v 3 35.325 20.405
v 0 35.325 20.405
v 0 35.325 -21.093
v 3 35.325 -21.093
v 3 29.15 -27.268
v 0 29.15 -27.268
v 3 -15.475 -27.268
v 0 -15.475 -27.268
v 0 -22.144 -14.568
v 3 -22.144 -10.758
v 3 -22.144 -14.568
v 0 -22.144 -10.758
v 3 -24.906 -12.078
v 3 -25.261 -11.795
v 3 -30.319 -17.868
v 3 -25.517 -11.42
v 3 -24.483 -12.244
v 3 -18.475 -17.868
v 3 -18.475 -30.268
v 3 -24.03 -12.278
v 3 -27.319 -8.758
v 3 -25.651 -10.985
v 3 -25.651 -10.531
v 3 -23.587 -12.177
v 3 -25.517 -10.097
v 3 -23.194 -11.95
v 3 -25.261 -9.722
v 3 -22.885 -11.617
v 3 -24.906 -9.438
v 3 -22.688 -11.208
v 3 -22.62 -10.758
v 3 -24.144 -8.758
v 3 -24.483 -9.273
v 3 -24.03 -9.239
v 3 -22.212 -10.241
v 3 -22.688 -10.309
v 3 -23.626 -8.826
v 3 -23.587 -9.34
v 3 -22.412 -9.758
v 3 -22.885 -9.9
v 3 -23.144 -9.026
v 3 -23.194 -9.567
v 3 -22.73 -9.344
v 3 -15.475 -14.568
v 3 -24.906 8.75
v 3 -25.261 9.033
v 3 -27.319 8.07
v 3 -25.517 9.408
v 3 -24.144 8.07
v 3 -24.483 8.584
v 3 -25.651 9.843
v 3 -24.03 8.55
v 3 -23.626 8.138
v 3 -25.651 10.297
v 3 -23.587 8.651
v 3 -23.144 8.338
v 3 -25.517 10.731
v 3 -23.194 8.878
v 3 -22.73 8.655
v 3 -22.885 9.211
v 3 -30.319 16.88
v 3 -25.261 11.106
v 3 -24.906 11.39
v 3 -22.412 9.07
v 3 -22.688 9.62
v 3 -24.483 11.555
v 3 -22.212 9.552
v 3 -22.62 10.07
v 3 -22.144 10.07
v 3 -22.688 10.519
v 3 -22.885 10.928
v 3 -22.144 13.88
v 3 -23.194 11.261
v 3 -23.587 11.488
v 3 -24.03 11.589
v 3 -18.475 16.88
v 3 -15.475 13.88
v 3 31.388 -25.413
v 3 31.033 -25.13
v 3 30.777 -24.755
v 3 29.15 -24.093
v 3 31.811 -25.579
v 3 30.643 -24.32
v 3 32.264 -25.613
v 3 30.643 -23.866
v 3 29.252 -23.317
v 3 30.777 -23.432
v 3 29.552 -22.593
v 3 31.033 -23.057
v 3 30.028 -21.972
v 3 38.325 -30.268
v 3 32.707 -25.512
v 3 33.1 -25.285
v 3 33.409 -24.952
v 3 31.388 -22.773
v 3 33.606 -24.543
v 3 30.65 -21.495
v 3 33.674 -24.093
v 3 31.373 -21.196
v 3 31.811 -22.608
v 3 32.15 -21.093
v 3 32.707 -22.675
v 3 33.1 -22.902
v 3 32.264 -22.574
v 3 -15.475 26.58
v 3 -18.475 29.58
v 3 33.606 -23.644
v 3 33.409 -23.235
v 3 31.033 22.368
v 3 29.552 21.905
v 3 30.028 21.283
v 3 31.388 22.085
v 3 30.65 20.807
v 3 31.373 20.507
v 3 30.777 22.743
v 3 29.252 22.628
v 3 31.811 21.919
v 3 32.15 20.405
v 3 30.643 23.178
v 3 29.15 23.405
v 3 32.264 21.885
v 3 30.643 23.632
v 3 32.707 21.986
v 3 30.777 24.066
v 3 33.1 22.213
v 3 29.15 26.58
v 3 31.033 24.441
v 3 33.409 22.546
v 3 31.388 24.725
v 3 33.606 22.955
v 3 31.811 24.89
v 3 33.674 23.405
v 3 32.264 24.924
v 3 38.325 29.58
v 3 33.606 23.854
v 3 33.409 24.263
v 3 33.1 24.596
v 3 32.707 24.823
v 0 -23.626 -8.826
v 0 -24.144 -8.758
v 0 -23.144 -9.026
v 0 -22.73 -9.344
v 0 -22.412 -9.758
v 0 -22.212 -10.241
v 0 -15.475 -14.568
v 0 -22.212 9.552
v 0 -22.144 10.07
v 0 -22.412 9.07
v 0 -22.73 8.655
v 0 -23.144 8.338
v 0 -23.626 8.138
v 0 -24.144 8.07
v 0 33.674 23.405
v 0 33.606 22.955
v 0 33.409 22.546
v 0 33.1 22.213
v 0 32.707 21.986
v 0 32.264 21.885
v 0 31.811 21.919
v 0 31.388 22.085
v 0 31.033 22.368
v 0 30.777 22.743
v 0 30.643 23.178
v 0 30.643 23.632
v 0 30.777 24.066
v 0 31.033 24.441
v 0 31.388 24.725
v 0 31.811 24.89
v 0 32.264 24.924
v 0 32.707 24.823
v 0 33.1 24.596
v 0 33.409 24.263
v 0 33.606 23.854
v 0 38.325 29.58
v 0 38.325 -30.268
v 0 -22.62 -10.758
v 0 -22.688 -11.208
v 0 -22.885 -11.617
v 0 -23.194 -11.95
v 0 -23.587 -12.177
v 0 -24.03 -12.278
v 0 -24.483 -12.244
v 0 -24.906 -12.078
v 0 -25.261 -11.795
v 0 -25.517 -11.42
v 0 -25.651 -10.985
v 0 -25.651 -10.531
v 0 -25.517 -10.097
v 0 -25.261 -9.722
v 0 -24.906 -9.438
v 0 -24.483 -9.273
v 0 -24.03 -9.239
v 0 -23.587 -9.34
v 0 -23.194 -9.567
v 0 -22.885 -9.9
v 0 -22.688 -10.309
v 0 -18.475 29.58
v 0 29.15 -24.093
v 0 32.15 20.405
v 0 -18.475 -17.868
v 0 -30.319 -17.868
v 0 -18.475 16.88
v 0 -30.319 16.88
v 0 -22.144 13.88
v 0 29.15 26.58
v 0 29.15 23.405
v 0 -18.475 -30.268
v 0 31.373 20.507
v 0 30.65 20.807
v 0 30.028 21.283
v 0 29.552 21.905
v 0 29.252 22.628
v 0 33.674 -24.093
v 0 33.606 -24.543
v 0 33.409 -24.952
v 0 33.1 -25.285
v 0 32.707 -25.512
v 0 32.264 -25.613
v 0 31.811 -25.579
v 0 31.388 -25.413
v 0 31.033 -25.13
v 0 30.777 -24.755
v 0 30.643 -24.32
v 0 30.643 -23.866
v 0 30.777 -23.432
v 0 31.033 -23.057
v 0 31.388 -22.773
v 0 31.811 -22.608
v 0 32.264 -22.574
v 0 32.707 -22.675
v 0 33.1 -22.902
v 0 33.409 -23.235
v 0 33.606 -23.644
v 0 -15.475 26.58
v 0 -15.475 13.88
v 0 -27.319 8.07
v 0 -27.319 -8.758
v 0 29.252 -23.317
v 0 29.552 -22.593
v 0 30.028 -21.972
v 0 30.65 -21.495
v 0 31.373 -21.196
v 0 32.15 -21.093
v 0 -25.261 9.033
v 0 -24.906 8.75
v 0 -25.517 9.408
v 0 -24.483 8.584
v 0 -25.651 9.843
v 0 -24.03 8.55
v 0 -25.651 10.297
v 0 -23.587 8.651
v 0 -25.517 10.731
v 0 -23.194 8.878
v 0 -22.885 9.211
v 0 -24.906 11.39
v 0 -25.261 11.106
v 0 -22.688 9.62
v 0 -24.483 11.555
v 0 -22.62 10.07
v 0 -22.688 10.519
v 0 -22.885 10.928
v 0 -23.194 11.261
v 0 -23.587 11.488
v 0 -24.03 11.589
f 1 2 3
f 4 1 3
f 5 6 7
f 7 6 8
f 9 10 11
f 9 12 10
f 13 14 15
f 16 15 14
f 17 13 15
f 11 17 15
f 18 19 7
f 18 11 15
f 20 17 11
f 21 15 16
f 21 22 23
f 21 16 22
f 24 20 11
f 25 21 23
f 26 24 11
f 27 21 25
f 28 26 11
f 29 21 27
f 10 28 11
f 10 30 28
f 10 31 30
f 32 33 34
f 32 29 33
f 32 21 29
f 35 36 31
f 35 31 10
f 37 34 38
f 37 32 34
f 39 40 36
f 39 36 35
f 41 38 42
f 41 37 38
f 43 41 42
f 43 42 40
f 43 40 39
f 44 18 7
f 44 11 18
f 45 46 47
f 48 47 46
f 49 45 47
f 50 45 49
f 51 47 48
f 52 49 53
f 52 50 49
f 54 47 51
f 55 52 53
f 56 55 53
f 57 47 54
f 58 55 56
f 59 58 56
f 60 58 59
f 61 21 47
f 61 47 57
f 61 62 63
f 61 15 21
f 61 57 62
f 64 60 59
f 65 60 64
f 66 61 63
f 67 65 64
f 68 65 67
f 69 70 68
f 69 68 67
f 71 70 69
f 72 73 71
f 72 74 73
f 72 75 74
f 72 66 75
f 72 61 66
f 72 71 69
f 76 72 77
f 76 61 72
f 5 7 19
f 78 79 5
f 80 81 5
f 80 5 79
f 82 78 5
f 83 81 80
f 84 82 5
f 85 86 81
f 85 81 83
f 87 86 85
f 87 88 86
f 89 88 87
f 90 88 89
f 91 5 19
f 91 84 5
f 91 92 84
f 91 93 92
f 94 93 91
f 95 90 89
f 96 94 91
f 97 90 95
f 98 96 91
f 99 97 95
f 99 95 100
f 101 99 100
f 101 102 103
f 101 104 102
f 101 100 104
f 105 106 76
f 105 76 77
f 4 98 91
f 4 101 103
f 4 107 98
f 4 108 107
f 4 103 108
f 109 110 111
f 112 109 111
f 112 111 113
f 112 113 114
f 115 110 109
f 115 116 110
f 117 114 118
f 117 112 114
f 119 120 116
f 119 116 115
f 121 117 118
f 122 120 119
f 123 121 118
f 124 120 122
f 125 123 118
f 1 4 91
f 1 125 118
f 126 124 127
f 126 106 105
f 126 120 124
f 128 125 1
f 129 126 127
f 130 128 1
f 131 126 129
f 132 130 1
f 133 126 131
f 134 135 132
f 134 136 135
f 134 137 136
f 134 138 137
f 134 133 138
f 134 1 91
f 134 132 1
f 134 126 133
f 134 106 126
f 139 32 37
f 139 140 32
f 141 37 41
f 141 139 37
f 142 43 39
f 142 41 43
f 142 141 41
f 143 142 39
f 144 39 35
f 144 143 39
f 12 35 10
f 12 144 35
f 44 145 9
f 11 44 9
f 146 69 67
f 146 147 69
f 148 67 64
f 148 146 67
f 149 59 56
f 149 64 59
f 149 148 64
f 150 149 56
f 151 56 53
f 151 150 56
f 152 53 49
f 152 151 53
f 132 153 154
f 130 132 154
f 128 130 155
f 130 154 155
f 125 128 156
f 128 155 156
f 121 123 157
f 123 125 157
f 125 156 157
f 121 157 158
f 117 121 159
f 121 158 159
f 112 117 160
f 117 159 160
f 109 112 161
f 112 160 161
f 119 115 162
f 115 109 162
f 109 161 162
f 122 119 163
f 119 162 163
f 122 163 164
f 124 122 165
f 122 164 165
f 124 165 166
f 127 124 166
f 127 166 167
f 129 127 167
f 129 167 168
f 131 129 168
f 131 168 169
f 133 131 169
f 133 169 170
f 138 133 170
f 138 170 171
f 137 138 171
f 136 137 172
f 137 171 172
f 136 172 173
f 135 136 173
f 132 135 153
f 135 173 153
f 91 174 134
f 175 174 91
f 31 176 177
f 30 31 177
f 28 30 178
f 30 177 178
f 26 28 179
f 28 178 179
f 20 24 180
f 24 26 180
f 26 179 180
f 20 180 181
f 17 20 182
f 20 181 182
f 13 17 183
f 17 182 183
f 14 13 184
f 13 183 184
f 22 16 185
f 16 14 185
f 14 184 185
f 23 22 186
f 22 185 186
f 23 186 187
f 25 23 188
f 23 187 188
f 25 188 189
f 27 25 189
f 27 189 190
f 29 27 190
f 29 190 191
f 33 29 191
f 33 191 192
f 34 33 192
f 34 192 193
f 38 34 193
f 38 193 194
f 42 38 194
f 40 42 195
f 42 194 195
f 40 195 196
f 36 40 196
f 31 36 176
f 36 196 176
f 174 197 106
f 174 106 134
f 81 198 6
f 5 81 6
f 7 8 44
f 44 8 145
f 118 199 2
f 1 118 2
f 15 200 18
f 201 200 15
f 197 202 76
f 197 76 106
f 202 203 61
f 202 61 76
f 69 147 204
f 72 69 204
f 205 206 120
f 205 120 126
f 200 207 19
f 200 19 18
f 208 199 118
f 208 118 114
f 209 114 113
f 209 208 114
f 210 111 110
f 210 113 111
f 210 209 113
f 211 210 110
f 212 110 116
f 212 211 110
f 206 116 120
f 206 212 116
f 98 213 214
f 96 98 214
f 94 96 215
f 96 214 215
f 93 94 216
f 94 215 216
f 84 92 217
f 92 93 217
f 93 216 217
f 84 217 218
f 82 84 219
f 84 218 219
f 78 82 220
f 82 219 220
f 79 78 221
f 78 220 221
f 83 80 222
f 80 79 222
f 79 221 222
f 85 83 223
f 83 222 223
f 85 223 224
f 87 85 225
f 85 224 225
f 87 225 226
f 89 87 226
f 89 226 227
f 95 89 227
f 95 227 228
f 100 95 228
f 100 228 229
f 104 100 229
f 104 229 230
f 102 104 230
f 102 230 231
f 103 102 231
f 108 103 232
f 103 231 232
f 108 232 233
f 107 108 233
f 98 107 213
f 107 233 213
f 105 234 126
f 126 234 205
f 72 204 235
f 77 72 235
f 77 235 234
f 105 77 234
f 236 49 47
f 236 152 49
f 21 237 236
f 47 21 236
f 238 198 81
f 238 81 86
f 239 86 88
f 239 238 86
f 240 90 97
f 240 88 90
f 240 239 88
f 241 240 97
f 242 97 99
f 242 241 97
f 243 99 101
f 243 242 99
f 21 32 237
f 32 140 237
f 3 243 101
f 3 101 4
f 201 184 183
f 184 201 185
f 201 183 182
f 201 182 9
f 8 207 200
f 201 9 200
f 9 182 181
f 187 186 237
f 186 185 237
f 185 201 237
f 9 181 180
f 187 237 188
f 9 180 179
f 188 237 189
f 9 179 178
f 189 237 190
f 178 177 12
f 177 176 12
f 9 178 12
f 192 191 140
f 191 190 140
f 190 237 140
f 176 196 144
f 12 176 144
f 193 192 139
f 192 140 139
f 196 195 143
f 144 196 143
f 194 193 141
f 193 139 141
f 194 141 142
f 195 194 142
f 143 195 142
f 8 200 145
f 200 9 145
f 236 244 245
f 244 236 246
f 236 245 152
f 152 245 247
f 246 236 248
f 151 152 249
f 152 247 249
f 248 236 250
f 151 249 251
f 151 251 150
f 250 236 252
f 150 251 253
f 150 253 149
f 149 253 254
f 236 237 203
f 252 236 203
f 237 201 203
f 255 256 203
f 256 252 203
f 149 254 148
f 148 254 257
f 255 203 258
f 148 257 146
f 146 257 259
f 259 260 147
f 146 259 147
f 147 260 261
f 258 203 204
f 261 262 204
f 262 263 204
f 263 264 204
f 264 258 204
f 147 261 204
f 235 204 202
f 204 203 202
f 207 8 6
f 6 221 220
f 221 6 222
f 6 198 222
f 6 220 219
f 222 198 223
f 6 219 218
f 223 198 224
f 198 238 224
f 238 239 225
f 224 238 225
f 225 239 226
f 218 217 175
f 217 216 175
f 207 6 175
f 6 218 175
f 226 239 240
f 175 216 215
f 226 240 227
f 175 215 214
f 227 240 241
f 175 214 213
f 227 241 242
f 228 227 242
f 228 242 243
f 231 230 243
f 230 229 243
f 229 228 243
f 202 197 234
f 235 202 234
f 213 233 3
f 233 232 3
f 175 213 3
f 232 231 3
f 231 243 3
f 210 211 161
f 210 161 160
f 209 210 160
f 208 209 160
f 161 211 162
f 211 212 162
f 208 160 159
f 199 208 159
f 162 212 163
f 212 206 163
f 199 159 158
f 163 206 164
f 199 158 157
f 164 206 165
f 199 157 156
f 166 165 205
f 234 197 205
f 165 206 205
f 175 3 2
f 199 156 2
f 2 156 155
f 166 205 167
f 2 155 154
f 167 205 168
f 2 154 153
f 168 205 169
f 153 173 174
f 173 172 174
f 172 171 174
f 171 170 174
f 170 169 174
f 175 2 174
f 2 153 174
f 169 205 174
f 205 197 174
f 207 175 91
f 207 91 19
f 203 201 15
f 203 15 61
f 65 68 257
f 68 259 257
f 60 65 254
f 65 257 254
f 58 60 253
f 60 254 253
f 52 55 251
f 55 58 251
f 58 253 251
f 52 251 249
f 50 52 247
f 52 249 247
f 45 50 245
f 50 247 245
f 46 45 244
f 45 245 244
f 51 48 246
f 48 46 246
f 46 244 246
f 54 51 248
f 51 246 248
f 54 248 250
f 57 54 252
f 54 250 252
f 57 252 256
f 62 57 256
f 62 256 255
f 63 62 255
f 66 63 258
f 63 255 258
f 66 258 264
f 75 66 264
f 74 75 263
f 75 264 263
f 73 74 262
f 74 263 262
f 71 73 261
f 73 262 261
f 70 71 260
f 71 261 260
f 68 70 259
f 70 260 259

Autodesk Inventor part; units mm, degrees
ref_plane "YZ Plane" through (0, 0, 0) normal (1, 0, 0) x (0, 1, 0)
ref_plane "XZ Plane" through (0, 0, 0) normal (0, 1, 0) x (-1, 0, 0)
ref_plane "XY Plane" through (0, 0, 0) normal (0, 0, 1) x (1, 0, 0)
sketch "Sketch1" plane through (0, 0, 0) normal (1, 0, 0) x (0, 1, 0)
  line L0 (35.3248, 20.4047) -> (35.3248, -21.0933)
  line L1 (29.1498, -27.2683) -> (-15.4752, -27.2683)
  line L2 (-15.4752, -27.2683) -> (-15.4752, -14.5683)
  line L3 (-15.4752, -14.5683) -> (-22.144, -14.5683)
  line L4 (-27.319, -8.7583) -> (-27.319, 8.0697)
  line L5 (-22.144, 13.8797) -> (-15.4752, 13.8797)
  line L6 (-15.4752, 13.8797) -> (-15.4752, 26.5797)
  line L7 (-15.4752, 26.5797) -> (29.1498, 26.5797)
  circle A0 centre (32.1498, 23.4047) radius 1.524
  circle A1 centre (32.1498, -24.0933) radius 1.524
  circle A2 centre (-24.144, -10.7583) radius 1.524
  circle A3 centre (-24.144, 10.0697) radius 1.524
  arc A4 (32.1498, -21.0933) -> (29.1498, -24.0933) centre (32.1498, -24.0933) ccw
  line L8 (29.1498, -24.0933) -> (29.1498, -27.2683)
  line L9 (32.1498, -21.0933) -> (35.3248, -21.0933)
  line L10 (38.3248, -21.0933) -> (38.3248, -27.2683)
  line L11 (38.3248, -27.2683) -> (38.3248, -30.2683)
  line L12 (38.3248, -30.2683) -> (-15.4752, -30.2683)
  line L13 (-15.4752, -30.2683) -> (-18.4752, -30.2683)
  line L14 (-18.4752, -30.2683) -> (-18.4752, -17.8683)
  line L15 (-18.4752, -17.8683) -> (-27.319, -17.8683)
  line L16 (-27.319, -17.8683) -> (-30.319, -17.8683)
  line L17 (-30.319, -17.8683) -> (-30.319, 13.8797)
  line L18 (-30.319, 13.8797) -> (-30.319, 16.8797)
  line L19 (-30.319, 16.8797) -> (-18.4752, 16.8797)
  line L20 (-18.4752, 16.8797) -> (-18.4752, 26.5797)
  line L21 (-18.4752, 26.5797) -> (-18.4752, 29.5797)
  line L22 (-18.4752, 29.5797) -> (35.3248, 29.5797)
  line L23 (35.3248, 29.5797) -> (38.3248, 29.5797)
  line L24 (38.3248, 29.5797) -> (38.3248, -21.0933)
  line L25 (32.1498, 20.4047) -> (38.3248, 20.4047)
  line L26 (29.1498, 23.4047) -> (29.1498, 29.5797)
  arc A5 (29.1498, 23.4047) -> (32.1498, 20.4047) centre (32.1498, 23.4047) ccw
  line L27 (-24.144, 8.0697) -> (-30.319, 8.0697)
  line L28 (-22.144, 10.0697) -> (-22.144, 16.8797)
  arc A6 (-24.144, 8.0697) -> (-22.144, 10.0697) centre (-24.144, 10.0697) ccw
  line L29 (-24.144, -10.7583) -> (-22.144, -10.7583) construction
  line L30 (-24.144, -8.7583) -> (-30.319, -8.7583)
  line L31 (-22.144, -10.7583) -> (-22.144, -17.8683)
  arc A7 (-22.144, -10.7583) -> (-24.144, -8.7583) centre (-24.144, -10.7583) ccw
  line L32 (35.3248, -21.0933) -> (38.3248, -21.0933)
  line L33 (29.1498, -27.2683) -> (29.1498, -30.2683)
  point P0 (0, 0)
  point P1 (0, 0)
extrude "Extrusion1" add sketch "Sketch1" along normal blind 3 contours L25 L24 L32 L0 | L25 A5 L26 L22 L23 L24 | L32 L10 L11 L12 L33 L8 A4 L9 | L7 L6 L5 L28 L19 L20 L21 L22 L26 | L33 L12 L13 L14 L15 L31 L3 L2 L1 | L28 A6 L27 L17 L18 L19 | L31 L15 L16 L17 L30 A7 | L4 L30 L17 L27
properties part number "pixy mount"
